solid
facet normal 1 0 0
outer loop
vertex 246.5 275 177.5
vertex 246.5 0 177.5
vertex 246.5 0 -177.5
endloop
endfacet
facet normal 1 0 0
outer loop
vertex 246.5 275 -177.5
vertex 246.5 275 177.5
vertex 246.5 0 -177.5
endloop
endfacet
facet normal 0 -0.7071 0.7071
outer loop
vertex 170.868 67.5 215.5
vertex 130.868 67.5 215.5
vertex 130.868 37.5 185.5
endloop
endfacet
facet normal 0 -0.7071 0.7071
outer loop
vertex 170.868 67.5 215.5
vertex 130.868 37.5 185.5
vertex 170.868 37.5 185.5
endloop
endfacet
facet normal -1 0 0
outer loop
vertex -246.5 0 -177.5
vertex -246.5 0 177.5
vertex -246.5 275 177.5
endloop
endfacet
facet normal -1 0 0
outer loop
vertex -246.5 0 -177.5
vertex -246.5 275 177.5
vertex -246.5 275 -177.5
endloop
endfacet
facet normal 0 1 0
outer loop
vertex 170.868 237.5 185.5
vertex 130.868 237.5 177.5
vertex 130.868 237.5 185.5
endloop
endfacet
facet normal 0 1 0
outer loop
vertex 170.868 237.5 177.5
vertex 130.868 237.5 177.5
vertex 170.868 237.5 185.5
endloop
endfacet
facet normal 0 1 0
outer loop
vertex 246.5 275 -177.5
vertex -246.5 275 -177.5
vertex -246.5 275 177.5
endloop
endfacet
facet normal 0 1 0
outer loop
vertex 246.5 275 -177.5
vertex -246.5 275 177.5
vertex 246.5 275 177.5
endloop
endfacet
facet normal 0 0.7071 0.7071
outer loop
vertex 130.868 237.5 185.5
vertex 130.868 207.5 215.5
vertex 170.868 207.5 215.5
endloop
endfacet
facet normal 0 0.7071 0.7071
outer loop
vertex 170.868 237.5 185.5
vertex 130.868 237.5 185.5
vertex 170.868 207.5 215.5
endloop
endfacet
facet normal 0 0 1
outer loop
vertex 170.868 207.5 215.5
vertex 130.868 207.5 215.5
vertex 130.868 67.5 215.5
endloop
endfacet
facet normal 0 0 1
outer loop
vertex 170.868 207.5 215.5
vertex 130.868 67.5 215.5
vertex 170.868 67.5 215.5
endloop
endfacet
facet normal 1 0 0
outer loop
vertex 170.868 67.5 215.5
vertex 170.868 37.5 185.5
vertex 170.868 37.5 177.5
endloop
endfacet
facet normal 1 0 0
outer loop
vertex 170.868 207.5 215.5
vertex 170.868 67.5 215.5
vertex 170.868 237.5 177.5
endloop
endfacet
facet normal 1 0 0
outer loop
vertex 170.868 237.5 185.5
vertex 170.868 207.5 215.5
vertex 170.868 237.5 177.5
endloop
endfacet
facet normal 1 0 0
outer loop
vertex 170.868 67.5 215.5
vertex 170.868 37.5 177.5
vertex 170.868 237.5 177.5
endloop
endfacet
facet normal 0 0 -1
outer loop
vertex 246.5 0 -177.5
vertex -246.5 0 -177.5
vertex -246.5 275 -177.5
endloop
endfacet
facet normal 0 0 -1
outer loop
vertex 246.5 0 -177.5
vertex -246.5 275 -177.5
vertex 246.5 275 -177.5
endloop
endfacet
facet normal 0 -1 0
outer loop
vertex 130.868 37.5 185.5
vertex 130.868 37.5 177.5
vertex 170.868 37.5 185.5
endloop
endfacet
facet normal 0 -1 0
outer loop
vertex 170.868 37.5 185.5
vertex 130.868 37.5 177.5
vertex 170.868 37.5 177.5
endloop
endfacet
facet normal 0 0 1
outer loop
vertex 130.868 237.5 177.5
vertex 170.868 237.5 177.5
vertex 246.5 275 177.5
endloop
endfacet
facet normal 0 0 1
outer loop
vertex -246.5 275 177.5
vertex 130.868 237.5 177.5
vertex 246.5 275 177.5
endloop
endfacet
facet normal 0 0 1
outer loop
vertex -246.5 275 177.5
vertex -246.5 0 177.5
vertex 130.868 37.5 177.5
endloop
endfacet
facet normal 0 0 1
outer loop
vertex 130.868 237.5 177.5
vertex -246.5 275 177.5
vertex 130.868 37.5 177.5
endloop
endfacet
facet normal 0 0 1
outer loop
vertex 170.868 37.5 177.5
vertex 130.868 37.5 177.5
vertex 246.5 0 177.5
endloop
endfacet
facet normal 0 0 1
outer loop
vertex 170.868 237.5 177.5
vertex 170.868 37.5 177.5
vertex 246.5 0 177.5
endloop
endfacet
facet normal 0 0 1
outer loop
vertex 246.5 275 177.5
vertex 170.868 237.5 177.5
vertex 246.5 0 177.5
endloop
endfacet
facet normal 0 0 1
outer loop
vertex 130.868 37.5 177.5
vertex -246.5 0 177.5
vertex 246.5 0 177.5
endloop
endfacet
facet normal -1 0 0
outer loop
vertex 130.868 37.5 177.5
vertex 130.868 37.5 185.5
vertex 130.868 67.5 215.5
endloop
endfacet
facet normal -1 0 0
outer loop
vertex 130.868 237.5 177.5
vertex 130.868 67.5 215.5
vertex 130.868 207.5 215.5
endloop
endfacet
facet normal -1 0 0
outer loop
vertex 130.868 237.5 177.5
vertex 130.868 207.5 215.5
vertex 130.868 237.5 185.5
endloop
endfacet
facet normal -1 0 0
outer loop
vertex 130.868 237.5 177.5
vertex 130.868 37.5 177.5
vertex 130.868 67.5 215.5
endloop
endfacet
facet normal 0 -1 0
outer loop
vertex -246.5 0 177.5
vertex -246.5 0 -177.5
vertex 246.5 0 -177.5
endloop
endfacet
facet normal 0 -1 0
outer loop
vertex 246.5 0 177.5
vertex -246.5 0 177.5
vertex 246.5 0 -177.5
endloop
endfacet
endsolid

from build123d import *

# Parameters (mm, degrees)
SKETCH1_W           = 493
SKETCH1_H           = 355
BOSS_EXTRUDE1_DEPTH = 275
SKETCH2_W           = 40
SKETCH2_H           = 200
BOSS_EXTRUDE2_DEPTH = 38
CHAMFER1_SIZE       = 30


with BuildPart() as part:
    # Sketch1 → Boss-Extrude1 (new body)
    with BuildSketch(Plane(origin=(0, 0, 0), x_dir=(1, 0, 0), z_dir=(0, 1, 0))):
        Rectangle(SKETCH1_W, SKETCH1_H)
    extrude(amount=BOSS_EXTRUDE1_DEPTH)

    # Sketch2 → Boss-Extrude2 (add)
    with BuildSketch(Plane.XY.offset(177.5)):
        with Locations((150.868479839, 137.5)):
            Rectangle(SKETCH2_W, SKETCH2_H)
    extrude(amount=BOSS_EXTRUDE2_DEPTH)

    # Chamfer1
    chamfer1_edges = [part.edges().sort_by_distance(p)[0] for p in [
        (150.868479839, 37.5, 215.5),
        (150.868479839, 237.5, 215.5),
    ]]
    chamfer(chamfer1_edges, length=CHAMFER1_SIZE)


solid = part.part
